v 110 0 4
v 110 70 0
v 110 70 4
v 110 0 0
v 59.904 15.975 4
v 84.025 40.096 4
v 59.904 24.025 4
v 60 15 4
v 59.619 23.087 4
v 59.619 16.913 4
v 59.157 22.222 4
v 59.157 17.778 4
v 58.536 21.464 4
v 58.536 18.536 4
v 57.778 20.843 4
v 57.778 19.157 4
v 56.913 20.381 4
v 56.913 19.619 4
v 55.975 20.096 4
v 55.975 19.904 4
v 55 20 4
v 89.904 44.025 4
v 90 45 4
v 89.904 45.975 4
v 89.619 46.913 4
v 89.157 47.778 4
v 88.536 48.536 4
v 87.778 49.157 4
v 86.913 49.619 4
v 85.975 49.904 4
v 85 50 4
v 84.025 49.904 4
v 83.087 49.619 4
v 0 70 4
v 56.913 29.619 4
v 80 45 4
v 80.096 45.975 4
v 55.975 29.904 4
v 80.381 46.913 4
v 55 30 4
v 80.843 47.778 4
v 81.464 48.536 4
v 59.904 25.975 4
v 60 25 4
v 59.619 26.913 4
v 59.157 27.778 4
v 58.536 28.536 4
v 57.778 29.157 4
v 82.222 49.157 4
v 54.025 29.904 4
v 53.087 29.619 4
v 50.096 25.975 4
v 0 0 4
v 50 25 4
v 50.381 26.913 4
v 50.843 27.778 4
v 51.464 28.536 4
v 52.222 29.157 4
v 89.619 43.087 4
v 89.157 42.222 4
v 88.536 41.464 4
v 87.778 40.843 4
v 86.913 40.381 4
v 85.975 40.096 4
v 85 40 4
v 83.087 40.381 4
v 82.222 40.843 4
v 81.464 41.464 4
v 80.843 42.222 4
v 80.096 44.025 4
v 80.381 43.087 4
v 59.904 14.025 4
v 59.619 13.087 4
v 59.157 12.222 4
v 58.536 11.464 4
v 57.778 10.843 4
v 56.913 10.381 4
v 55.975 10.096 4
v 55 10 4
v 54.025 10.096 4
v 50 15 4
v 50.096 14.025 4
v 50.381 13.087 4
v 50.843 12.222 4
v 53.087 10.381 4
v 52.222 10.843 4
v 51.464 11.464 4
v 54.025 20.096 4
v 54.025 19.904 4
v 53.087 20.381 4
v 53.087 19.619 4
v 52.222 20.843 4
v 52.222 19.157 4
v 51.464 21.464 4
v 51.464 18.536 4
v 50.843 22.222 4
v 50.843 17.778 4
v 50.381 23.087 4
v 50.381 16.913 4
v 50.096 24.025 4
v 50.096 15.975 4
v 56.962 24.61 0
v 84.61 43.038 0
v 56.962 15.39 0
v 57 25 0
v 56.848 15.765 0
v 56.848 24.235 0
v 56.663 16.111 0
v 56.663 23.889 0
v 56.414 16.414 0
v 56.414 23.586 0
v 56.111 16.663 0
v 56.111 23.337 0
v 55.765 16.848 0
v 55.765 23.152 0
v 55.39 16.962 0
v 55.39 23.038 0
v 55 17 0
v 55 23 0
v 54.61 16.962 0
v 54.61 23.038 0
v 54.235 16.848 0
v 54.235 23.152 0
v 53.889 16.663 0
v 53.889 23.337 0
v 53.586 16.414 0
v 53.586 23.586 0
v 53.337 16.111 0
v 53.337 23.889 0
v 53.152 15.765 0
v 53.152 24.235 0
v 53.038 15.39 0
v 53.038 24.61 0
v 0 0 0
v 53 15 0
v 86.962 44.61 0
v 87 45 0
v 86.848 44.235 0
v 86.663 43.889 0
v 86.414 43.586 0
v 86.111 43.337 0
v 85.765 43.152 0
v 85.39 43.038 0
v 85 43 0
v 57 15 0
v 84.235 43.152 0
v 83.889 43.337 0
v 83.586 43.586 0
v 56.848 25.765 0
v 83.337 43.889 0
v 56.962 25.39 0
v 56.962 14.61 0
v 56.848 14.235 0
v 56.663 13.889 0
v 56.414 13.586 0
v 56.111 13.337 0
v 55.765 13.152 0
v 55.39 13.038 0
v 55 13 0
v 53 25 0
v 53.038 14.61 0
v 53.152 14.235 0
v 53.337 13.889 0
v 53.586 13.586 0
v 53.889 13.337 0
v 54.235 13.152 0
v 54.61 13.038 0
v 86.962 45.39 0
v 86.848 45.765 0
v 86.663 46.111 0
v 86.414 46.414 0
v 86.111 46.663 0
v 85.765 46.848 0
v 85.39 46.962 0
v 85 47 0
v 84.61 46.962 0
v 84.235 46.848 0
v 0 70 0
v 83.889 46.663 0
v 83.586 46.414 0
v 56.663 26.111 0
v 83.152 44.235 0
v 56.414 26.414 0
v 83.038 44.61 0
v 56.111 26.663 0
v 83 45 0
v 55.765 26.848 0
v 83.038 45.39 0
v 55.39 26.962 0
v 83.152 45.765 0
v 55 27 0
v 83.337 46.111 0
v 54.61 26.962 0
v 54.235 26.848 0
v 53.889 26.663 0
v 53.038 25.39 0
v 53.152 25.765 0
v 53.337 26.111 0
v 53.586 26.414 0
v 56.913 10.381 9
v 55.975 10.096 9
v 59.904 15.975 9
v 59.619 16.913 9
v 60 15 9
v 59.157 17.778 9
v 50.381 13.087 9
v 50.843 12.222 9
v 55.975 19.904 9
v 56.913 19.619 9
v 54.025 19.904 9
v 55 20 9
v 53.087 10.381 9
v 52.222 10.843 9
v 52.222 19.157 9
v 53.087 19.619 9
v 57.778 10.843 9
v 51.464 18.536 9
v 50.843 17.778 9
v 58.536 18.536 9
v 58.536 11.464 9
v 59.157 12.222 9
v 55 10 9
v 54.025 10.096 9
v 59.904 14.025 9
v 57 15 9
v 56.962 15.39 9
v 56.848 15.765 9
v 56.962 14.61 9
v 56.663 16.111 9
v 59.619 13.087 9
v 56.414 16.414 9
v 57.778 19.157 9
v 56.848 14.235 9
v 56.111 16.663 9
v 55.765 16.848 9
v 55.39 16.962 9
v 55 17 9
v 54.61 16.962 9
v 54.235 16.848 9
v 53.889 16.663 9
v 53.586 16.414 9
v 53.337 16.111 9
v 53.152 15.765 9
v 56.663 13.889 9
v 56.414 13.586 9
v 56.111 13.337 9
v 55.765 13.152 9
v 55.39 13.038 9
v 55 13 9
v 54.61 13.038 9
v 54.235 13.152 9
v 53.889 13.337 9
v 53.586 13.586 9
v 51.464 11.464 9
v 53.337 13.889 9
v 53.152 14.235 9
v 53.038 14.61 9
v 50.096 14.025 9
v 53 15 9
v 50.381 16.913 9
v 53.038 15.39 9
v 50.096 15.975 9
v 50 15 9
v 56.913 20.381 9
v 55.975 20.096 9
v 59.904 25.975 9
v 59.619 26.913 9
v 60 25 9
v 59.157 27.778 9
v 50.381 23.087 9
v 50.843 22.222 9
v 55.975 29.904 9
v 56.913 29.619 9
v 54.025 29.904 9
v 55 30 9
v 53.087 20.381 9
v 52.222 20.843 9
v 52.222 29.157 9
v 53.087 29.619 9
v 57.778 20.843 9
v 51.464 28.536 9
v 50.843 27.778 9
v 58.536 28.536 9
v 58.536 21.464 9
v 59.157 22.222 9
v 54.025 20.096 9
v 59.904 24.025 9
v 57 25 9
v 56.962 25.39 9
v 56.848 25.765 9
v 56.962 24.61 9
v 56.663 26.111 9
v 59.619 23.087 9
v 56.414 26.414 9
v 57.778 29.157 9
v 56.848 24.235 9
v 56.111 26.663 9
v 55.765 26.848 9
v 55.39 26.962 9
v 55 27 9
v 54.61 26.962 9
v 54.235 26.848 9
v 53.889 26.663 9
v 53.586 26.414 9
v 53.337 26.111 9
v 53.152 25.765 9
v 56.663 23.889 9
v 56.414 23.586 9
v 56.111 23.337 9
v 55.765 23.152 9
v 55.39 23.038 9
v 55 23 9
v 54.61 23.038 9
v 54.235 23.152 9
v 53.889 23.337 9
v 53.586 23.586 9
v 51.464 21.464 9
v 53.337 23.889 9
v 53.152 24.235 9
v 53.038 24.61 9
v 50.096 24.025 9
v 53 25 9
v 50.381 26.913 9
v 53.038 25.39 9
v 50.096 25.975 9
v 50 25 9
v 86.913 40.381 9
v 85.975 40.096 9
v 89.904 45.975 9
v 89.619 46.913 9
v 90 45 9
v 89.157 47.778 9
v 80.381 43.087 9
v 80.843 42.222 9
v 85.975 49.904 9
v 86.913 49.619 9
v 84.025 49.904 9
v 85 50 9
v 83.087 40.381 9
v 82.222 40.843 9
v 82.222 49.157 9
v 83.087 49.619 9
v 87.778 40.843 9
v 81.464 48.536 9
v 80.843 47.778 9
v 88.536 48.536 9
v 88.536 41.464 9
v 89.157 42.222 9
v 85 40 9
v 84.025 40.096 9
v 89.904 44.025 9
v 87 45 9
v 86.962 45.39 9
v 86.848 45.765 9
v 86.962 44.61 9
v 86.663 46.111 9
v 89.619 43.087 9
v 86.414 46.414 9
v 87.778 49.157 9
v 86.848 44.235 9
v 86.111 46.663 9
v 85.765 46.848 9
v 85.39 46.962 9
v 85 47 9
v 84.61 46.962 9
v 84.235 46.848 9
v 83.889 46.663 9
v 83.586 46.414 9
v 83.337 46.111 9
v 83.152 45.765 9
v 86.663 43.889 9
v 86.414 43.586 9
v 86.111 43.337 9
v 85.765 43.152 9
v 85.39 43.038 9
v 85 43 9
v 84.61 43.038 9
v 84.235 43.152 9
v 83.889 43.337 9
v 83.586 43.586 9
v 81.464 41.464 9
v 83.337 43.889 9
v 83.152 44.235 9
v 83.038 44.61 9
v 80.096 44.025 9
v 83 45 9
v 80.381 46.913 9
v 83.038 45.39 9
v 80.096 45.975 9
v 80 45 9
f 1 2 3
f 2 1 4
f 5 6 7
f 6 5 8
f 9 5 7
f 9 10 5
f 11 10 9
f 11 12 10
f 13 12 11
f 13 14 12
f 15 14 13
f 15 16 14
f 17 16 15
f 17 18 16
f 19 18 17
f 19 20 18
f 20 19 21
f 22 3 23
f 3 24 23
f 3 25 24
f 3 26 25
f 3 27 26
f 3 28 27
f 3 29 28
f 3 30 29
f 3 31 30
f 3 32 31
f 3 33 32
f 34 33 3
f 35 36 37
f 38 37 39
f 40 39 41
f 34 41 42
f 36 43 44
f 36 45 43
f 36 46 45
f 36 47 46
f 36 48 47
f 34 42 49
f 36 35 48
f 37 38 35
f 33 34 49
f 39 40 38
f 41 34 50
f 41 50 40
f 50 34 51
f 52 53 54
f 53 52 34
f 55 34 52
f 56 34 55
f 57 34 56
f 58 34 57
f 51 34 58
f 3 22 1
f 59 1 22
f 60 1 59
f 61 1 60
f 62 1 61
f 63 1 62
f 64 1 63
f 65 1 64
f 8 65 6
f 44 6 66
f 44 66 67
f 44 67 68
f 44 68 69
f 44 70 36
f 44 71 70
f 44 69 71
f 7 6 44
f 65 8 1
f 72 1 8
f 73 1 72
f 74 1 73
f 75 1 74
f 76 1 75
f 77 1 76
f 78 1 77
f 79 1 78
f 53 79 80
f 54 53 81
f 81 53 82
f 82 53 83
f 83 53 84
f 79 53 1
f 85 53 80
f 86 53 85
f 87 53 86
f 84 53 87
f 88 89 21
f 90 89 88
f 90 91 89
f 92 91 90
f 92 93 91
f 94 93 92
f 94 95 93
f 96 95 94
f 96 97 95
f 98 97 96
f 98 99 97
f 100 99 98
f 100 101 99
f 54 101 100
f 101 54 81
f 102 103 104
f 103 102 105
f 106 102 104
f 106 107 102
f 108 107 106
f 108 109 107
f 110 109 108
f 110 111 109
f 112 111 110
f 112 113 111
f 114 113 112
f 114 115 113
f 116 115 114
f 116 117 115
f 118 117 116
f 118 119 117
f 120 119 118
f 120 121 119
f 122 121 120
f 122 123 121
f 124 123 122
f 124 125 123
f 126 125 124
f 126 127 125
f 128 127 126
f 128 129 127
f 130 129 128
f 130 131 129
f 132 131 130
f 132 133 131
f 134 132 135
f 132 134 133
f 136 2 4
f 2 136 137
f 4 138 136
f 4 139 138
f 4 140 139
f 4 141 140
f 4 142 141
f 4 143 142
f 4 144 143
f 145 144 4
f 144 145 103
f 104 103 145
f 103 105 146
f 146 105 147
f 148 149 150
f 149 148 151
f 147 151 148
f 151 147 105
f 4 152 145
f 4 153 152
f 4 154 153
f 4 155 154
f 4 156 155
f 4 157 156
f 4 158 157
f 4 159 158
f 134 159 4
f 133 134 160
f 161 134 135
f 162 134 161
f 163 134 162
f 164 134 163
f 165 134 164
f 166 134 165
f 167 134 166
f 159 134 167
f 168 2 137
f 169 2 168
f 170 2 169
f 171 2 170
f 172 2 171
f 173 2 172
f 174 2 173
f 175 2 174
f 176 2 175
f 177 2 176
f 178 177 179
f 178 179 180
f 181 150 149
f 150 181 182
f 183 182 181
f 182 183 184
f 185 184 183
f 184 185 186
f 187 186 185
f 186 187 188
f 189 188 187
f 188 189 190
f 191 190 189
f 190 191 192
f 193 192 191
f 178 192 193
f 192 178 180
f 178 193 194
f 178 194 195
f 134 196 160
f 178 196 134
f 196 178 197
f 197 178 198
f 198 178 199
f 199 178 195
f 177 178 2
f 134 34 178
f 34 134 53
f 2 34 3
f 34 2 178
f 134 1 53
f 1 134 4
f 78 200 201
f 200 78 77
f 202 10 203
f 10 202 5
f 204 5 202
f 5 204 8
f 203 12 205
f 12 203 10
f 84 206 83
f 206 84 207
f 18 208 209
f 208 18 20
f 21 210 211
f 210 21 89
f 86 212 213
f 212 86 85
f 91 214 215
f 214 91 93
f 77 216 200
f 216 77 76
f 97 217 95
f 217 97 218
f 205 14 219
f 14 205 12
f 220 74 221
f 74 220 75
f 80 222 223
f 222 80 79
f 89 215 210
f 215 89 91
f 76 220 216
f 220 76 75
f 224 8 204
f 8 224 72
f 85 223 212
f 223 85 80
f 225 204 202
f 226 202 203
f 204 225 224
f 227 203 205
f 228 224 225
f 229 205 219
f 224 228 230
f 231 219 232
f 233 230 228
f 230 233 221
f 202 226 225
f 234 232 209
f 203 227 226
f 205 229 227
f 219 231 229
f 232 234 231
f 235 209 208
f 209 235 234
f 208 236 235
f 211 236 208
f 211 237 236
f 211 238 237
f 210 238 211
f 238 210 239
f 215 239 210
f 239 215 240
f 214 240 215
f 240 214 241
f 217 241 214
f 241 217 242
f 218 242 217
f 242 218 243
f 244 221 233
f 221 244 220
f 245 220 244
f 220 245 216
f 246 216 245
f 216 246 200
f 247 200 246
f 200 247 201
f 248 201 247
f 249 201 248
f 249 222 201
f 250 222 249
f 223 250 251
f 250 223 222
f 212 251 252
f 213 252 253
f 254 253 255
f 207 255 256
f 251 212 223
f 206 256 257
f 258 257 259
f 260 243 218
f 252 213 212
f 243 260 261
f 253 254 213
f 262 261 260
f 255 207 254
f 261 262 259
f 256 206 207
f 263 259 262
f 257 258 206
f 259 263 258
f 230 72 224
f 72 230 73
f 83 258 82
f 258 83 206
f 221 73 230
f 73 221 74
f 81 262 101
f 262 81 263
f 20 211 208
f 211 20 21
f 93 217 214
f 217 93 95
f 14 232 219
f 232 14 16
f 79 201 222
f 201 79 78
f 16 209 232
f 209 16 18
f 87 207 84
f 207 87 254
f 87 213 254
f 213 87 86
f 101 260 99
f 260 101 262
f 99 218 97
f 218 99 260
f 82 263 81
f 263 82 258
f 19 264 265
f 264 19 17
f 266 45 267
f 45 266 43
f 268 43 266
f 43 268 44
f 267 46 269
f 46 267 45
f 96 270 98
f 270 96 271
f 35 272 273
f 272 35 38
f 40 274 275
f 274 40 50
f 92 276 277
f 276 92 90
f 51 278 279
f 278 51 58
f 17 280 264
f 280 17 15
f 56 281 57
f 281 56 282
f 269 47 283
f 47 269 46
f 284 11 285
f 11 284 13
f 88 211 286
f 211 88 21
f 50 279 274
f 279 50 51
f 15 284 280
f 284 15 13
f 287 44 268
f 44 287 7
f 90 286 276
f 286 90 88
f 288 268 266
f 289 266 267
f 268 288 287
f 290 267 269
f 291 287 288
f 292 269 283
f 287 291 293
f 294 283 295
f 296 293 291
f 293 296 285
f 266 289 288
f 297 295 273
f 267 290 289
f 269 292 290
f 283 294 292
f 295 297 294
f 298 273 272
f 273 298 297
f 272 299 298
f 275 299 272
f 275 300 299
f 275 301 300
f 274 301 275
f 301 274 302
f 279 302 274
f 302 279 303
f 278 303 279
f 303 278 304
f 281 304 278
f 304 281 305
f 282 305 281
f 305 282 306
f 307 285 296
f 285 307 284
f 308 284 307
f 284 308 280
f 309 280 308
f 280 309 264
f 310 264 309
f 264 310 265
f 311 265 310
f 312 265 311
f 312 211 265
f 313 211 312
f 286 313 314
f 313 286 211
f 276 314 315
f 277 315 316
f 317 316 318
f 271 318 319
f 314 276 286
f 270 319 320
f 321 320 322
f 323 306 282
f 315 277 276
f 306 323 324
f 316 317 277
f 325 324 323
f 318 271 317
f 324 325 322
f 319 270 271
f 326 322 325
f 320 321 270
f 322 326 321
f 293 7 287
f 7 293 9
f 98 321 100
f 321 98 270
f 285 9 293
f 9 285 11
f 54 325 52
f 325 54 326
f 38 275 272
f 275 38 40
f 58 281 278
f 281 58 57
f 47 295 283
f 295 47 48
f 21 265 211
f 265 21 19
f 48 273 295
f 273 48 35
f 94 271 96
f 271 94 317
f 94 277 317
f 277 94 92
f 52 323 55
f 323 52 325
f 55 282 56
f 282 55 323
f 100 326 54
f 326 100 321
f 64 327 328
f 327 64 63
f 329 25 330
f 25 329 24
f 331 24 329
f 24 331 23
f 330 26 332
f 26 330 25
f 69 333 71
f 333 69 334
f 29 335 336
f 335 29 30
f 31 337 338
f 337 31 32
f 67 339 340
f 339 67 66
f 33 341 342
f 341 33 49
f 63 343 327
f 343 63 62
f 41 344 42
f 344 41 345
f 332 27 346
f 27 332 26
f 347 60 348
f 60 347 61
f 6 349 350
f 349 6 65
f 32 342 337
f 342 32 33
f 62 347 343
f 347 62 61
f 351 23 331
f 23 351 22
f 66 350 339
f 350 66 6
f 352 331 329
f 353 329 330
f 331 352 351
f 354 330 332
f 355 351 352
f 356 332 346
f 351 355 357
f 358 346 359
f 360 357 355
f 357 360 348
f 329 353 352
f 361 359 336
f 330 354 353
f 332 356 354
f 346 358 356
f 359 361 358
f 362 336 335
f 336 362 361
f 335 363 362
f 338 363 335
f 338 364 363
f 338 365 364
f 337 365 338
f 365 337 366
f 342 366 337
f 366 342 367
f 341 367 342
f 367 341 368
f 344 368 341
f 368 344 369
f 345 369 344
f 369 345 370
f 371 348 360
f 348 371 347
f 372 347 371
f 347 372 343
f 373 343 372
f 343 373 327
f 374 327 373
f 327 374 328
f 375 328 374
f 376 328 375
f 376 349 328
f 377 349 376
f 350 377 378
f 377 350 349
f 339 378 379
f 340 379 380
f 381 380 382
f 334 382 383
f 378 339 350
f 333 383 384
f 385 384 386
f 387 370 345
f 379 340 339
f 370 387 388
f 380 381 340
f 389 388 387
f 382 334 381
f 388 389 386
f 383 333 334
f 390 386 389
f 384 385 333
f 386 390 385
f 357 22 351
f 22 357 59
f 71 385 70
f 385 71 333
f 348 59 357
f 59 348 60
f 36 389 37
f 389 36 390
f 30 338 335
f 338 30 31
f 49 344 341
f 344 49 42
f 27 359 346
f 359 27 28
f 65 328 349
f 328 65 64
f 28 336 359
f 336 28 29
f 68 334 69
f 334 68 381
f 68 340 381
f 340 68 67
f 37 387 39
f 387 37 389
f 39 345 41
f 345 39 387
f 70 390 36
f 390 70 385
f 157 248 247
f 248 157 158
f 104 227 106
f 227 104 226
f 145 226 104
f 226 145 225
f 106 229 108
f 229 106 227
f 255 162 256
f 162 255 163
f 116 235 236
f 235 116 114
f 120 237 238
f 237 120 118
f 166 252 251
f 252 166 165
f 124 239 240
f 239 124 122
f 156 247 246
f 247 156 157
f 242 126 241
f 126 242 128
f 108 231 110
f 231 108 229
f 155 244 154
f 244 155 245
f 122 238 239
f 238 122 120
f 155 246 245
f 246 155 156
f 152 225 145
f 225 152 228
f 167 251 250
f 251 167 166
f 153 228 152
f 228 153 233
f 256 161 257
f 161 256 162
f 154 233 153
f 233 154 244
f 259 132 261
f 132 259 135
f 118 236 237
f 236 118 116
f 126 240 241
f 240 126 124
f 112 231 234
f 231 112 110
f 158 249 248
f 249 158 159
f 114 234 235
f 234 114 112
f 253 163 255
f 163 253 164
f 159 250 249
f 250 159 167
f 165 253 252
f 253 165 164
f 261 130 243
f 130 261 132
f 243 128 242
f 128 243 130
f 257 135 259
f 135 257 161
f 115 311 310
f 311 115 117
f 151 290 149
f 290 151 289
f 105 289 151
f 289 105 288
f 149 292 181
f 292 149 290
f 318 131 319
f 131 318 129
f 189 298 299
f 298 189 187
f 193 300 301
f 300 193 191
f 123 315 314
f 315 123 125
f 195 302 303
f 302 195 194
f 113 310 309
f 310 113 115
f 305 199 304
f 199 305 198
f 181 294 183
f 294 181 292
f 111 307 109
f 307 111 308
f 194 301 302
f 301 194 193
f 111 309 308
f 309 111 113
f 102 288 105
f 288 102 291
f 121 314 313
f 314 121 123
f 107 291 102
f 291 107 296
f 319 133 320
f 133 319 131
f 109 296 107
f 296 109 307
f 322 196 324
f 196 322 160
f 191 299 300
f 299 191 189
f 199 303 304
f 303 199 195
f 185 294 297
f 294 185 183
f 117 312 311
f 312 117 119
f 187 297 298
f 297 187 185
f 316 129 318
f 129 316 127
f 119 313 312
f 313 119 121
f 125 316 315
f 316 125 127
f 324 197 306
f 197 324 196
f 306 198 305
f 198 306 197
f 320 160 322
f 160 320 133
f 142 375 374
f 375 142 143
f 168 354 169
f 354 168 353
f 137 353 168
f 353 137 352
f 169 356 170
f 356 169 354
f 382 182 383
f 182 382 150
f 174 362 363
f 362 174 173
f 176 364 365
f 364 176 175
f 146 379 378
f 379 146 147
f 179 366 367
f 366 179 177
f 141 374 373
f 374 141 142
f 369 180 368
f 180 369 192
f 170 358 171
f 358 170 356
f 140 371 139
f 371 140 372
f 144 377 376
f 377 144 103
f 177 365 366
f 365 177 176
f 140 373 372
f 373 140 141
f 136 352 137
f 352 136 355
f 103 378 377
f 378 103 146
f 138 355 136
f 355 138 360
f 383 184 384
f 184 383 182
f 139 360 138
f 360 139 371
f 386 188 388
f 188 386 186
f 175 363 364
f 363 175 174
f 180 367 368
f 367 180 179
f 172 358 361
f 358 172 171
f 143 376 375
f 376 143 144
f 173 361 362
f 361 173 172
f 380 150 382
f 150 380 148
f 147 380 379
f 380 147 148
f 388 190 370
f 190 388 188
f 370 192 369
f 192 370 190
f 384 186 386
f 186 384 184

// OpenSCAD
$fn = 32;

// ----------------------------------------------------------------------
// Boss field: plate with bosses at given coordinates
// ----------------------------------------------------------------------

// --- parameters (mm) ---
plate_l = 110;            // plate length, X
plate_w = 70;             // plate width, Y
plate_t = 4;              // plate thickness, Z
boss_d = 10;              // boss diameter
boss_h = 5;               // boss height above the plate
bore_d = 4;               // boss bore
fit_tol = 0.1;            // tolerance for press fits, mm
free_tol = 0.3;           // tolerance for clearance fits, mm

total_h = plate_t + boss_h;  // overall height

difference() {
  union() {
    cube([plate_l, plate_w, plate_t]);
    translate([55, 15, plate_t]) cylinder(h = boss_h, d = boss_d);
    translate([55, 25, plate_t]) cylinder(h = boss_h, d = boss_d);
    translate([85, 45, plate_t]) cylinder(h = boss_h, d = boss_d);
  }
  translate([55, 15, -1]) cylinder(h = total_h + 2, d = bore_d);
  translate([55, 25, -1]) cylinder(h = total_h + 2, d = bore_d);
  translate([85, 45, -1]) cylinder(h = total_h + 2, d = bore_d);
}
